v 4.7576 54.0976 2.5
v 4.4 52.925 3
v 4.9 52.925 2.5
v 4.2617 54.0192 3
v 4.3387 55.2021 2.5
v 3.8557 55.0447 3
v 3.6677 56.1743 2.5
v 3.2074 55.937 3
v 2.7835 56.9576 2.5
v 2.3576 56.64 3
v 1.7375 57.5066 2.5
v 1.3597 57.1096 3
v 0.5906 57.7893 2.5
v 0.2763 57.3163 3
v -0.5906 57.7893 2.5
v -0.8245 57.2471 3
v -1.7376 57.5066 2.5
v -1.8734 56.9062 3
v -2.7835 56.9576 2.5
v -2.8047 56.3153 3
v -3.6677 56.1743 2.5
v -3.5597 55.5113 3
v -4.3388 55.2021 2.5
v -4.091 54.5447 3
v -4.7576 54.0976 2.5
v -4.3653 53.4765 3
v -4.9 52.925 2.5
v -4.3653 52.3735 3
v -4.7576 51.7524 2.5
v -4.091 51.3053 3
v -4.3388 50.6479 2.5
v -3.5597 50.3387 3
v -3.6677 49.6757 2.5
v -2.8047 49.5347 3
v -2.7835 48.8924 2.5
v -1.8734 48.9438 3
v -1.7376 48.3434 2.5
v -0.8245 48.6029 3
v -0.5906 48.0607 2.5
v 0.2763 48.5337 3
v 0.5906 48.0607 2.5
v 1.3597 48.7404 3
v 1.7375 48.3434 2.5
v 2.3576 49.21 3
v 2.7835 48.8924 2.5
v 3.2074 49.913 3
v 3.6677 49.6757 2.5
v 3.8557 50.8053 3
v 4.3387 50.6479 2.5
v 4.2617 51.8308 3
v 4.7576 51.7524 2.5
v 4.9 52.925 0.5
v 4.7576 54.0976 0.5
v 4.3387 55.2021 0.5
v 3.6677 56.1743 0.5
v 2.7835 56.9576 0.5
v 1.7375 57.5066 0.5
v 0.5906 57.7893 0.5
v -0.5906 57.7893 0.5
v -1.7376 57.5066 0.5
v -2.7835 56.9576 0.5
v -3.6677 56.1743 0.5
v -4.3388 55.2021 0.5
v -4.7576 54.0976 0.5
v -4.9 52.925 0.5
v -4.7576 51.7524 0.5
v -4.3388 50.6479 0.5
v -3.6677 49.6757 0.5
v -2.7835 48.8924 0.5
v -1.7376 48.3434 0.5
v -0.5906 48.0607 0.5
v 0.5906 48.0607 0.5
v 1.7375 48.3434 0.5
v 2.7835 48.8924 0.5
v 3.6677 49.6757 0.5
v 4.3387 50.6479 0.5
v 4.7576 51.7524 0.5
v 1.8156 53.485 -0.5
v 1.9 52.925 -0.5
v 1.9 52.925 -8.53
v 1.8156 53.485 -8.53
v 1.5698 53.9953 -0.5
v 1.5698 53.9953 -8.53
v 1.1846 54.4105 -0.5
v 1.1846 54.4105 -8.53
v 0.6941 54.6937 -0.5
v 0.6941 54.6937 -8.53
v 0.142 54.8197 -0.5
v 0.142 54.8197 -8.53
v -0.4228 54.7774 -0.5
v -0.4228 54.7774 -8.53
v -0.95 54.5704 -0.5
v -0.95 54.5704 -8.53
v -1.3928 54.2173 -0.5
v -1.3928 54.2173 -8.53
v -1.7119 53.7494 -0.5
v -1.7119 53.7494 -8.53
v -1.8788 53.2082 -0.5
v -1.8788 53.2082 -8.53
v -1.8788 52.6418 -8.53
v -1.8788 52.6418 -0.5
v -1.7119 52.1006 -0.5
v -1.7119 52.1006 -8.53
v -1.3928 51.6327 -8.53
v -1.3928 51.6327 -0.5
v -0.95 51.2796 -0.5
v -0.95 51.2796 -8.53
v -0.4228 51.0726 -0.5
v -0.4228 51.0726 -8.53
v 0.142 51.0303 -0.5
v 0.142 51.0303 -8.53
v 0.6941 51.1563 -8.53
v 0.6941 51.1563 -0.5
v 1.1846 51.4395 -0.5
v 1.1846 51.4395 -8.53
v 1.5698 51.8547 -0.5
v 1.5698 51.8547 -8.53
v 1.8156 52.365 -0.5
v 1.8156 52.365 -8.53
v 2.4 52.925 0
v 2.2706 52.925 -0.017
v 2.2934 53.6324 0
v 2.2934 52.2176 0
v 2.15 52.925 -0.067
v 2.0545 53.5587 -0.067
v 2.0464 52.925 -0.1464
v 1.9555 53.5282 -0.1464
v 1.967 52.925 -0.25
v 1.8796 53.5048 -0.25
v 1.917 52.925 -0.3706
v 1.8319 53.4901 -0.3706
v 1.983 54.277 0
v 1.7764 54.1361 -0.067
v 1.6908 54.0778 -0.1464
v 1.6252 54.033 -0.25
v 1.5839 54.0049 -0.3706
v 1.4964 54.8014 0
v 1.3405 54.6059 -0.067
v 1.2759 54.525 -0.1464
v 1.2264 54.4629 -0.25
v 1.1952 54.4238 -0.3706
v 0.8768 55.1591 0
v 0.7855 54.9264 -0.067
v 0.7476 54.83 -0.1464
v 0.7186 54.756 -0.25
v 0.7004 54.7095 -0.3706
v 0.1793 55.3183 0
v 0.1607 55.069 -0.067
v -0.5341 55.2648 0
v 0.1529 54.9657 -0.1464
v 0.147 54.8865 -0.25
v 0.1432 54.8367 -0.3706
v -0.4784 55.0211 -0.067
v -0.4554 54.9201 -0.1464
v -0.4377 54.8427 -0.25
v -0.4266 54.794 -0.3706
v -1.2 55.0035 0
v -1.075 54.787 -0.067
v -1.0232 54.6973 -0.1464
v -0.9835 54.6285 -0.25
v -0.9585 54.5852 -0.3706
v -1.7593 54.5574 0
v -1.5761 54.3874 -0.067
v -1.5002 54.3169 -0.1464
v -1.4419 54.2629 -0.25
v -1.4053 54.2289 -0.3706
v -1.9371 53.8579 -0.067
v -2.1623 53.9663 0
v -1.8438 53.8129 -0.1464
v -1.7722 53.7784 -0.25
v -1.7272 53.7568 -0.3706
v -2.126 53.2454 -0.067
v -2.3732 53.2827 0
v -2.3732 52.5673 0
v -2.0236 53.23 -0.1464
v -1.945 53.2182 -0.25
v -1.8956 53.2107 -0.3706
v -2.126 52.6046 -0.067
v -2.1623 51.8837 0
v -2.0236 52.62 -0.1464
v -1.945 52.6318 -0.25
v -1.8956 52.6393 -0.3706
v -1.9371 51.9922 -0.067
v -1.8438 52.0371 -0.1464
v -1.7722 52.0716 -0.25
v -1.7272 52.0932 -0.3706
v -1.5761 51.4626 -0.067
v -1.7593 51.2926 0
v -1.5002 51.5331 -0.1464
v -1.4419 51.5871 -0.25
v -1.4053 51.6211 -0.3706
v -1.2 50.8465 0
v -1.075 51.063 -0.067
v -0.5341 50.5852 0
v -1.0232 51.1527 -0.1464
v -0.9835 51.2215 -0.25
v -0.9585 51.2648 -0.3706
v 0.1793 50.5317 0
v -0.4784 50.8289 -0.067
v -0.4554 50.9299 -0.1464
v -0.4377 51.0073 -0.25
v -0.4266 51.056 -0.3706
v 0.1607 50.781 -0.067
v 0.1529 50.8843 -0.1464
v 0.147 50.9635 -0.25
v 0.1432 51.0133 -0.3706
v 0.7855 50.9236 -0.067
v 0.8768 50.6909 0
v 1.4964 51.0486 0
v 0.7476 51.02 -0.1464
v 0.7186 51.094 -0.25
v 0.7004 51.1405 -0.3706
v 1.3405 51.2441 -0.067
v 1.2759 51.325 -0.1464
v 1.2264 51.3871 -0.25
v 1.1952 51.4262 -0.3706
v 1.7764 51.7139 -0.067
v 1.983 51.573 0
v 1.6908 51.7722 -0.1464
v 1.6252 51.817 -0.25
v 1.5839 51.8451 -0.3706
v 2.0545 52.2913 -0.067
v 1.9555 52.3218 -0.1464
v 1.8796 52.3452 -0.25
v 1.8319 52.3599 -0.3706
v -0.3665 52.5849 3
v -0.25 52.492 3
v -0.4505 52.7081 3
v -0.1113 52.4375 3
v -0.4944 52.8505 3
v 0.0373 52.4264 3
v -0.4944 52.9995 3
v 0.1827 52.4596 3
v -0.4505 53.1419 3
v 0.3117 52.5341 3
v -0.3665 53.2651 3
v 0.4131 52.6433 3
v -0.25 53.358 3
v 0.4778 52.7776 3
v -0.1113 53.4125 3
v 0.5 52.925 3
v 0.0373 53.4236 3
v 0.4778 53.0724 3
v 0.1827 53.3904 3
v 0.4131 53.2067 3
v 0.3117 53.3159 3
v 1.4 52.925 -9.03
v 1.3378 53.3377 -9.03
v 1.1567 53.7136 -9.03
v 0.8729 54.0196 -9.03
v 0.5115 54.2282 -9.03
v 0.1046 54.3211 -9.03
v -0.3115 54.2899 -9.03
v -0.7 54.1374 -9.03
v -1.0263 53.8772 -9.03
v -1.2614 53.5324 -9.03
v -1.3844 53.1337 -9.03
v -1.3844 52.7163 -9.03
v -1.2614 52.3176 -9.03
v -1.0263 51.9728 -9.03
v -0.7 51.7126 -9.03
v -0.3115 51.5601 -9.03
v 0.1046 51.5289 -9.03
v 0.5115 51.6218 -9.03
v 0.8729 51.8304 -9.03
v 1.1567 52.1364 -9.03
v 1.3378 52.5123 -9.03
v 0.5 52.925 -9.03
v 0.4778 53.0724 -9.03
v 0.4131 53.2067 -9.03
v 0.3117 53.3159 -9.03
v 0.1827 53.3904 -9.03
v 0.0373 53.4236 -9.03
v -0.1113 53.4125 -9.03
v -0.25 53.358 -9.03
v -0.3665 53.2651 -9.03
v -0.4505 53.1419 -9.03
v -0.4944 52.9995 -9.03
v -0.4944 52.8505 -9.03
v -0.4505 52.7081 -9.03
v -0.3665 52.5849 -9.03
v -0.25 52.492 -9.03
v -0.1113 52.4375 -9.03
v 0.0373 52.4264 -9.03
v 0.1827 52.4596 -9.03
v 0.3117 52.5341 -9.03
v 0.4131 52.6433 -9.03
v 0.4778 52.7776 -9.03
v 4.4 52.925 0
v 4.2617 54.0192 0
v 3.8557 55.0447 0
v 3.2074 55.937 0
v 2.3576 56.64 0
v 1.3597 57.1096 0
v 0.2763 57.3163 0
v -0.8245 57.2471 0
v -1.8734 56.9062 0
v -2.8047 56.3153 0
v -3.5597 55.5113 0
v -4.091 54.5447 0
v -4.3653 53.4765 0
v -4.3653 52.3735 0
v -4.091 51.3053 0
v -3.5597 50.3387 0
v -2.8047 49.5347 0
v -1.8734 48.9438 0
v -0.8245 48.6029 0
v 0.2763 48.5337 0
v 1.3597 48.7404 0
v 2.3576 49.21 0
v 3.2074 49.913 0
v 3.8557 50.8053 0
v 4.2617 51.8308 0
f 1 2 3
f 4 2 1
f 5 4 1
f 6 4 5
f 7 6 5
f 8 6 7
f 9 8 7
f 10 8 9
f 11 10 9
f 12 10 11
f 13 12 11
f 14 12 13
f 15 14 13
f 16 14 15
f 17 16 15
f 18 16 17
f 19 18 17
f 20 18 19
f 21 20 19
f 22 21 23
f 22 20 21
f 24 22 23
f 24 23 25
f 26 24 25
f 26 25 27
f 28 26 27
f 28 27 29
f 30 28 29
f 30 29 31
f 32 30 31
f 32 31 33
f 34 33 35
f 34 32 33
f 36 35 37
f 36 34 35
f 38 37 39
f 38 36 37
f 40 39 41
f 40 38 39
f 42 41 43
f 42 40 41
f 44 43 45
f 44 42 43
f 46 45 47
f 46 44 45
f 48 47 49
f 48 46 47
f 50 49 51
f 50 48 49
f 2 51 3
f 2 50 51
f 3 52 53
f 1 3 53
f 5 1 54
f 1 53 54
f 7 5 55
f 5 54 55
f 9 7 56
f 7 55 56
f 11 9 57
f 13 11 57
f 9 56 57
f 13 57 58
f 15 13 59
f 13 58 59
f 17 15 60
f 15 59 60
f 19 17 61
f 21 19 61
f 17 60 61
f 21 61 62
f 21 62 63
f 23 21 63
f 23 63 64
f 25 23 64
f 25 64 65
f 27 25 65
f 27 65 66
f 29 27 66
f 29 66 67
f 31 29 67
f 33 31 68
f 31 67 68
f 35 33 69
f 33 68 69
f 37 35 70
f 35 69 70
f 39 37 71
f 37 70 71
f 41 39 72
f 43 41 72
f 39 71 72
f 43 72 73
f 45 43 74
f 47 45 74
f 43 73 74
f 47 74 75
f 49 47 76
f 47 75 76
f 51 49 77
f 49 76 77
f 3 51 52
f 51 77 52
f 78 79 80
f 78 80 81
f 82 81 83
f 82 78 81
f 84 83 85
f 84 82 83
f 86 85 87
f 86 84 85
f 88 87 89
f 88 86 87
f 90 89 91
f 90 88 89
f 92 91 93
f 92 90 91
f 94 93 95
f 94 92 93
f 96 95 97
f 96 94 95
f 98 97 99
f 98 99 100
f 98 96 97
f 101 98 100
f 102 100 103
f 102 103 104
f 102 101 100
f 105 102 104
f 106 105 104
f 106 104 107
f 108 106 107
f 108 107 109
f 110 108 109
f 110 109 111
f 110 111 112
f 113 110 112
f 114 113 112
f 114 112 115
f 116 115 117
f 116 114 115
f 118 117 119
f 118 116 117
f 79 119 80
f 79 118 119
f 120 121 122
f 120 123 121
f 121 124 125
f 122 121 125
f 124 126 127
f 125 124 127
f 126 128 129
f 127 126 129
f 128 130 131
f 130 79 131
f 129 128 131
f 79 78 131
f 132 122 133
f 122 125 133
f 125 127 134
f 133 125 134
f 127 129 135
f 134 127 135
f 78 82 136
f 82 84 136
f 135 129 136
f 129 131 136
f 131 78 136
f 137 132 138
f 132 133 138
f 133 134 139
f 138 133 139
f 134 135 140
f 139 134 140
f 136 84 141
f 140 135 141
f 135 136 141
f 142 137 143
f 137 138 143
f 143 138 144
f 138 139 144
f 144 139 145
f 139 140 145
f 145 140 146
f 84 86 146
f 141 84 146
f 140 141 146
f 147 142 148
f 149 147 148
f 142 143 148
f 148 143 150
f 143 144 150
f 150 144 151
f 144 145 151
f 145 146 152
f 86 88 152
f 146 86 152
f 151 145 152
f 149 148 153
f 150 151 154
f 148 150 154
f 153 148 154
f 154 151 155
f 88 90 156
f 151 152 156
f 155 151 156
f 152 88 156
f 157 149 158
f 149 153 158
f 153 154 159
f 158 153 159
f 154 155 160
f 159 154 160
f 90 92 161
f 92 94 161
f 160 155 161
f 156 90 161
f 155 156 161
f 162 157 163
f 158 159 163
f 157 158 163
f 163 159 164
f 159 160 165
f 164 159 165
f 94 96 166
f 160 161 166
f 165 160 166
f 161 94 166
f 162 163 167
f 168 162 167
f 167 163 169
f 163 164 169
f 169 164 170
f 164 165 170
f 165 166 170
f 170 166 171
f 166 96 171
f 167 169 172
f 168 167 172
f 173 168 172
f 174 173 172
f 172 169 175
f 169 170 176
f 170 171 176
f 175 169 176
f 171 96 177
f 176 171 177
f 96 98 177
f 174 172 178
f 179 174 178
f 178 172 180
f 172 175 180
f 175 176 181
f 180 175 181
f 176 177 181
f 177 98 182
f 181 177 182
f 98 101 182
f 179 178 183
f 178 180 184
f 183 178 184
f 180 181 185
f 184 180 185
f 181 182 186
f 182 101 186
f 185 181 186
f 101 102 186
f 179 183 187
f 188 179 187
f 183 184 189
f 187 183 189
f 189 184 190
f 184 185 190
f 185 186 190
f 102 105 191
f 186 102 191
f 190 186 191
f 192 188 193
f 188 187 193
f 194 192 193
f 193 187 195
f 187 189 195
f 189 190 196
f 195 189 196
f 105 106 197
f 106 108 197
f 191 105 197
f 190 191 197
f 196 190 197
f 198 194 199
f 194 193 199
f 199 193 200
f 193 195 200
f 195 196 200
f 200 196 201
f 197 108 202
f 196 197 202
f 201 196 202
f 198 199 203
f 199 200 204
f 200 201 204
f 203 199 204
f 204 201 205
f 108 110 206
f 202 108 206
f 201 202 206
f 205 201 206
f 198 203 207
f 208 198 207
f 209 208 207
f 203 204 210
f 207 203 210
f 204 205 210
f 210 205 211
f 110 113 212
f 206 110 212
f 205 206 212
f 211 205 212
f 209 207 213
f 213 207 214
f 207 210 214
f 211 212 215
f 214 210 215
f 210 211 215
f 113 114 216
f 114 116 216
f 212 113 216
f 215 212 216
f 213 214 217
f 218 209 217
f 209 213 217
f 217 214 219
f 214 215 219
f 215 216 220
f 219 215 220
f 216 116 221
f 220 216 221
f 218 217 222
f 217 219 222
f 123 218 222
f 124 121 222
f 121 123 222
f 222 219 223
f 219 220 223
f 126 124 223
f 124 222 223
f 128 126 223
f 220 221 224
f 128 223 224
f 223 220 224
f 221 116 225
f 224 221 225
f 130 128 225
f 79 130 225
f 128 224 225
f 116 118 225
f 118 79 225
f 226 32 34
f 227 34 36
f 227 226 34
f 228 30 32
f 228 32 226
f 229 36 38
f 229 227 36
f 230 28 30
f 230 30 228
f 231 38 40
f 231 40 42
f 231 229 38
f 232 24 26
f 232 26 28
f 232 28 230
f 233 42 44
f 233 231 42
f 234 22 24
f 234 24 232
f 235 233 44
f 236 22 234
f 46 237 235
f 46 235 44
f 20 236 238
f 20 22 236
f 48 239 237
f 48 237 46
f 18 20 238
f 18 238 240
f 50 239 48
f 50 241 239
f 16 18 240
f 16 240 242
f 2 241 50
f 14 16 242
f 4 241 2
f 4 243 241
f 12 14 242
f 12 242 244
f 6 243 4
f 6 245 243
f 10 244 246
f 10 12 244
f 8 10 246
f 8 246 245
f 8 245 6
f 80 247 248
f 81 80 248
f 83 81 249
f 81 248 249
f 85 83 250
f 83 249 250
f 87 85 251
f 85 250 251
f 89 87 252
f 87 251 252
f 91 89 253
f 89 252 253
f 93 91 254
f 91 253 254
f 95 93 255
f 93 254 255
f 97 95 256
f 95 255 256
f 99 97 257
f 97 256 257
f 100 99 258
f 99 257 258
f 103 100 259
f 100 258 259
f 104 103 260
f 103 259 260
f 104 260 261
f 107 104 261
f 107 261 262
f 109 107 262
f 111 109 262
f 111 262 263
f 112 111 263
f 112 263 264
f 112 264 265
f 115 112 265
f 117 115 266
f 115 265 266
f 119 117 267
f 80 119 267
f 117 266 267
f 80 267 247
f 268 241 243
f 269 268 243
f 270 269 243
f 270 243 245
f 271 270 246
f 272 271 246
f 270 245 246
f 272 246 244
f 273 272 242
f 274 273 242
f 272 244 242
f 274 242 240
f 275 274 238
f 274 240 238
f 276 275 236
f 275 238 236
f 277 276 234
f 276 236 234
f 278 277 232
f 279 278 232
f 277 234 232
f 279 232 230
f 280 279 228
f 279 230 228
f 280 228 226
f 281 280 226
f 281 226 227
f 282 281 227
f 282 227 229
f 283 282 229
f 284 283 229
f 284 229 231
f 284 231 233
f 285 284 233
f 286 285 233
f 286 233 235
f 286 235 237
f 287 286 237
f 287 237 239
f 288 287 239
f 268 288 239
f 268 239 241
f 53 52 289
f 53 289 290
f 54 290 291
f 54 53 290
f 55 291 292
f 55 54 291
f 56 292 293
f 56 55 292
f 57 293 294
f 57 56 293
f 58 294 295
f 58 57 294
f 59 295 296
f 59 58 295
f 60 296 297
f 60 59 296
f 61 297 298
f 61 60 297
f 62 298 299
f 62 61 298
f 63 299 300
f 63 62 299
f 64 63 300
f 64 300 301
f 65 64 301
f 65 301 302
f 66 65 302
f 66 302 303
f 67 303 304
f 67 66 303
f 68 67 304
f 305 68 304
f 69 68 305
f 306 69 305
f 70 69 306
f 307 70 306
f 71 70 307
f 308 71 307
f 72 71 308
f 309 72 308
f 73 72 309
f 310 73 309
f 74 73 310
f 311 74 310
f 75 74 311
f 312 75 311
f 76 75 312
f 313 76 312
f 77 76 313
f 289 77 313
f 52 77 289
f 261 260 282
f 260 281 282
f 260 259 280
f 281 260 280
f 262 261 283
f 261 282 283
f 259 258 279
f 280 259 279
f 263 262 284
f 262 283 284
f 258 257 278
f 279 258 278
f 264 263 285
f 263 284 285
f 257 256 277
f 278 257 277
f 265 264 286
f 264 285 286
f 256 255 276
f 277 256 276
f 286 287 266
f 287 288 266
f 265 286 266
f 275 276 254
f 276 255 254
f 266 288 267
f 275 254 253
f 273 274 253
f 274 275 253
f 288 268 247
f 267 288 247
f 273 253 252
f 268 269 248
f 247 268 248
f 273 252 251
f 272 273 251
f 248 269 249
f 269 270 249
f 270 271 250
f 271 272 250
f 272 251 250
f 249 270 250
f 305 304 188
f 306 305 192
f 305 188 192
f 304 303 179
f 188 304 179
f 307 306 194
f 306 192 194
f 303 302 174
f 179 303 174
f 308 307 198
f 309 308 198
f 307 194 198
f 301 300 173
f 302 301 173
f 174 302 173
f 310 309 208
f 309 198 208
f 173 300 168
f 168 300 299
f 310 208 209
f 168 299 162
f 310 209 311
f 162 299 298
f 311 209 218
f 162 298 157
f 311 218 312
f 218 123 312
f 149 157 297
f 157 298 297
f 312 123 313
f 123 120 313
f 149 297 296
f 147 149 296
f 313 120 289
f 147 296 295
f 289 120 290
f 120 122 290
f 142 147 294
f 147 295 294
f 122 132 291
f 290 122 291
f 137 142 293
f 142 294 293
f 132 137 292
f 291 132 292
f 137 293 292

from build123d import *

# Parameters (mm, degrees)
SKETCH1_R           = 4.9
SKETCH1_R_2         = 1.9
BOSS_EXTRUDE1_DEPTH = 3
SKETCH1_4_R         = 1.9
BOSS_EXTRUDE2_DEPTH = 9.03
FILLET1_R           = 0.5
CHAMFER1_SIZE       = 0.5
CUT_EXTRUDE1_REACH  = 14.03
SKETCH2_R           = 0.5


with BuildPart() as part:
    # Sketch1 → Boss-Extrude1 (new body)
    with BuildSketch(Plane.XY):
        with Locations((-1.7071e-05, 52.925001209)):
            Circle(SKETCH1_R)
        with Locations((-1.7071e-05, 52.925001209)):
            Circle(SKETCH1_R_2, mode=Mode.SUBTRACT)
        with Locations((-1.7071e-05, 52.925001209)):
            Circle(SKETCH1_R_2)
    extrude(amount=BOSS_EXTRUDE1_DEPTH)

    # Sketch1<4> → Boss-Extrude2 (add)
    with BuildSketch(Plane.XY):
        with Locations((-1.7071e-05, 52.925001209)):
            Circle(SKETCH1_4_R)
    extrude(amount=-BOSS_EXTRUDE2_DEPTH)

    # Fillet1
    fillet1_edges = [part.edges().sort_by_distance(p)[0] for p in [
        (-1.900017071, 52.925001209, 0),
    ]]
    fillet(fillet1_edges, radius=FILLET1_R)

    # Chamfer1
    chamfer1_edges = [part.edges().sort_by_distance(p)[0] for p in [
        (-4.900017071, 52.925001209, 3),
        (-1.900017071, 52.925001209, -9.03),
        (-4.900017071, 52.925001209, 0),
    ]]
    chamfer(chamfer1_edges, length=CHAMFER1_SIZE)

    # Sketch2 → Cut-Extrude1 (cut, up to next)
    with BuildSketch(Plane.XY.offset(3), mode=Mode.PRIVATE) as cut_extrude1_sk1:
        with Locations((-1.7071e-05, 52.925001209)):
            Circle(SKETCH2_R)
    cut_extrude1_tool1 = extrude(cut_extrude1_sk1.sketch, amount=-CUT_EXTRUDE1_REACH, mode=Mode.PRIVATE) & part.part
    add(cut_extrude1_tool1.solids().sort_by_distance((-1.7e-05, 52.925001, 3))[0], mode=Mode.SUBTRACT)


solid = part.part
